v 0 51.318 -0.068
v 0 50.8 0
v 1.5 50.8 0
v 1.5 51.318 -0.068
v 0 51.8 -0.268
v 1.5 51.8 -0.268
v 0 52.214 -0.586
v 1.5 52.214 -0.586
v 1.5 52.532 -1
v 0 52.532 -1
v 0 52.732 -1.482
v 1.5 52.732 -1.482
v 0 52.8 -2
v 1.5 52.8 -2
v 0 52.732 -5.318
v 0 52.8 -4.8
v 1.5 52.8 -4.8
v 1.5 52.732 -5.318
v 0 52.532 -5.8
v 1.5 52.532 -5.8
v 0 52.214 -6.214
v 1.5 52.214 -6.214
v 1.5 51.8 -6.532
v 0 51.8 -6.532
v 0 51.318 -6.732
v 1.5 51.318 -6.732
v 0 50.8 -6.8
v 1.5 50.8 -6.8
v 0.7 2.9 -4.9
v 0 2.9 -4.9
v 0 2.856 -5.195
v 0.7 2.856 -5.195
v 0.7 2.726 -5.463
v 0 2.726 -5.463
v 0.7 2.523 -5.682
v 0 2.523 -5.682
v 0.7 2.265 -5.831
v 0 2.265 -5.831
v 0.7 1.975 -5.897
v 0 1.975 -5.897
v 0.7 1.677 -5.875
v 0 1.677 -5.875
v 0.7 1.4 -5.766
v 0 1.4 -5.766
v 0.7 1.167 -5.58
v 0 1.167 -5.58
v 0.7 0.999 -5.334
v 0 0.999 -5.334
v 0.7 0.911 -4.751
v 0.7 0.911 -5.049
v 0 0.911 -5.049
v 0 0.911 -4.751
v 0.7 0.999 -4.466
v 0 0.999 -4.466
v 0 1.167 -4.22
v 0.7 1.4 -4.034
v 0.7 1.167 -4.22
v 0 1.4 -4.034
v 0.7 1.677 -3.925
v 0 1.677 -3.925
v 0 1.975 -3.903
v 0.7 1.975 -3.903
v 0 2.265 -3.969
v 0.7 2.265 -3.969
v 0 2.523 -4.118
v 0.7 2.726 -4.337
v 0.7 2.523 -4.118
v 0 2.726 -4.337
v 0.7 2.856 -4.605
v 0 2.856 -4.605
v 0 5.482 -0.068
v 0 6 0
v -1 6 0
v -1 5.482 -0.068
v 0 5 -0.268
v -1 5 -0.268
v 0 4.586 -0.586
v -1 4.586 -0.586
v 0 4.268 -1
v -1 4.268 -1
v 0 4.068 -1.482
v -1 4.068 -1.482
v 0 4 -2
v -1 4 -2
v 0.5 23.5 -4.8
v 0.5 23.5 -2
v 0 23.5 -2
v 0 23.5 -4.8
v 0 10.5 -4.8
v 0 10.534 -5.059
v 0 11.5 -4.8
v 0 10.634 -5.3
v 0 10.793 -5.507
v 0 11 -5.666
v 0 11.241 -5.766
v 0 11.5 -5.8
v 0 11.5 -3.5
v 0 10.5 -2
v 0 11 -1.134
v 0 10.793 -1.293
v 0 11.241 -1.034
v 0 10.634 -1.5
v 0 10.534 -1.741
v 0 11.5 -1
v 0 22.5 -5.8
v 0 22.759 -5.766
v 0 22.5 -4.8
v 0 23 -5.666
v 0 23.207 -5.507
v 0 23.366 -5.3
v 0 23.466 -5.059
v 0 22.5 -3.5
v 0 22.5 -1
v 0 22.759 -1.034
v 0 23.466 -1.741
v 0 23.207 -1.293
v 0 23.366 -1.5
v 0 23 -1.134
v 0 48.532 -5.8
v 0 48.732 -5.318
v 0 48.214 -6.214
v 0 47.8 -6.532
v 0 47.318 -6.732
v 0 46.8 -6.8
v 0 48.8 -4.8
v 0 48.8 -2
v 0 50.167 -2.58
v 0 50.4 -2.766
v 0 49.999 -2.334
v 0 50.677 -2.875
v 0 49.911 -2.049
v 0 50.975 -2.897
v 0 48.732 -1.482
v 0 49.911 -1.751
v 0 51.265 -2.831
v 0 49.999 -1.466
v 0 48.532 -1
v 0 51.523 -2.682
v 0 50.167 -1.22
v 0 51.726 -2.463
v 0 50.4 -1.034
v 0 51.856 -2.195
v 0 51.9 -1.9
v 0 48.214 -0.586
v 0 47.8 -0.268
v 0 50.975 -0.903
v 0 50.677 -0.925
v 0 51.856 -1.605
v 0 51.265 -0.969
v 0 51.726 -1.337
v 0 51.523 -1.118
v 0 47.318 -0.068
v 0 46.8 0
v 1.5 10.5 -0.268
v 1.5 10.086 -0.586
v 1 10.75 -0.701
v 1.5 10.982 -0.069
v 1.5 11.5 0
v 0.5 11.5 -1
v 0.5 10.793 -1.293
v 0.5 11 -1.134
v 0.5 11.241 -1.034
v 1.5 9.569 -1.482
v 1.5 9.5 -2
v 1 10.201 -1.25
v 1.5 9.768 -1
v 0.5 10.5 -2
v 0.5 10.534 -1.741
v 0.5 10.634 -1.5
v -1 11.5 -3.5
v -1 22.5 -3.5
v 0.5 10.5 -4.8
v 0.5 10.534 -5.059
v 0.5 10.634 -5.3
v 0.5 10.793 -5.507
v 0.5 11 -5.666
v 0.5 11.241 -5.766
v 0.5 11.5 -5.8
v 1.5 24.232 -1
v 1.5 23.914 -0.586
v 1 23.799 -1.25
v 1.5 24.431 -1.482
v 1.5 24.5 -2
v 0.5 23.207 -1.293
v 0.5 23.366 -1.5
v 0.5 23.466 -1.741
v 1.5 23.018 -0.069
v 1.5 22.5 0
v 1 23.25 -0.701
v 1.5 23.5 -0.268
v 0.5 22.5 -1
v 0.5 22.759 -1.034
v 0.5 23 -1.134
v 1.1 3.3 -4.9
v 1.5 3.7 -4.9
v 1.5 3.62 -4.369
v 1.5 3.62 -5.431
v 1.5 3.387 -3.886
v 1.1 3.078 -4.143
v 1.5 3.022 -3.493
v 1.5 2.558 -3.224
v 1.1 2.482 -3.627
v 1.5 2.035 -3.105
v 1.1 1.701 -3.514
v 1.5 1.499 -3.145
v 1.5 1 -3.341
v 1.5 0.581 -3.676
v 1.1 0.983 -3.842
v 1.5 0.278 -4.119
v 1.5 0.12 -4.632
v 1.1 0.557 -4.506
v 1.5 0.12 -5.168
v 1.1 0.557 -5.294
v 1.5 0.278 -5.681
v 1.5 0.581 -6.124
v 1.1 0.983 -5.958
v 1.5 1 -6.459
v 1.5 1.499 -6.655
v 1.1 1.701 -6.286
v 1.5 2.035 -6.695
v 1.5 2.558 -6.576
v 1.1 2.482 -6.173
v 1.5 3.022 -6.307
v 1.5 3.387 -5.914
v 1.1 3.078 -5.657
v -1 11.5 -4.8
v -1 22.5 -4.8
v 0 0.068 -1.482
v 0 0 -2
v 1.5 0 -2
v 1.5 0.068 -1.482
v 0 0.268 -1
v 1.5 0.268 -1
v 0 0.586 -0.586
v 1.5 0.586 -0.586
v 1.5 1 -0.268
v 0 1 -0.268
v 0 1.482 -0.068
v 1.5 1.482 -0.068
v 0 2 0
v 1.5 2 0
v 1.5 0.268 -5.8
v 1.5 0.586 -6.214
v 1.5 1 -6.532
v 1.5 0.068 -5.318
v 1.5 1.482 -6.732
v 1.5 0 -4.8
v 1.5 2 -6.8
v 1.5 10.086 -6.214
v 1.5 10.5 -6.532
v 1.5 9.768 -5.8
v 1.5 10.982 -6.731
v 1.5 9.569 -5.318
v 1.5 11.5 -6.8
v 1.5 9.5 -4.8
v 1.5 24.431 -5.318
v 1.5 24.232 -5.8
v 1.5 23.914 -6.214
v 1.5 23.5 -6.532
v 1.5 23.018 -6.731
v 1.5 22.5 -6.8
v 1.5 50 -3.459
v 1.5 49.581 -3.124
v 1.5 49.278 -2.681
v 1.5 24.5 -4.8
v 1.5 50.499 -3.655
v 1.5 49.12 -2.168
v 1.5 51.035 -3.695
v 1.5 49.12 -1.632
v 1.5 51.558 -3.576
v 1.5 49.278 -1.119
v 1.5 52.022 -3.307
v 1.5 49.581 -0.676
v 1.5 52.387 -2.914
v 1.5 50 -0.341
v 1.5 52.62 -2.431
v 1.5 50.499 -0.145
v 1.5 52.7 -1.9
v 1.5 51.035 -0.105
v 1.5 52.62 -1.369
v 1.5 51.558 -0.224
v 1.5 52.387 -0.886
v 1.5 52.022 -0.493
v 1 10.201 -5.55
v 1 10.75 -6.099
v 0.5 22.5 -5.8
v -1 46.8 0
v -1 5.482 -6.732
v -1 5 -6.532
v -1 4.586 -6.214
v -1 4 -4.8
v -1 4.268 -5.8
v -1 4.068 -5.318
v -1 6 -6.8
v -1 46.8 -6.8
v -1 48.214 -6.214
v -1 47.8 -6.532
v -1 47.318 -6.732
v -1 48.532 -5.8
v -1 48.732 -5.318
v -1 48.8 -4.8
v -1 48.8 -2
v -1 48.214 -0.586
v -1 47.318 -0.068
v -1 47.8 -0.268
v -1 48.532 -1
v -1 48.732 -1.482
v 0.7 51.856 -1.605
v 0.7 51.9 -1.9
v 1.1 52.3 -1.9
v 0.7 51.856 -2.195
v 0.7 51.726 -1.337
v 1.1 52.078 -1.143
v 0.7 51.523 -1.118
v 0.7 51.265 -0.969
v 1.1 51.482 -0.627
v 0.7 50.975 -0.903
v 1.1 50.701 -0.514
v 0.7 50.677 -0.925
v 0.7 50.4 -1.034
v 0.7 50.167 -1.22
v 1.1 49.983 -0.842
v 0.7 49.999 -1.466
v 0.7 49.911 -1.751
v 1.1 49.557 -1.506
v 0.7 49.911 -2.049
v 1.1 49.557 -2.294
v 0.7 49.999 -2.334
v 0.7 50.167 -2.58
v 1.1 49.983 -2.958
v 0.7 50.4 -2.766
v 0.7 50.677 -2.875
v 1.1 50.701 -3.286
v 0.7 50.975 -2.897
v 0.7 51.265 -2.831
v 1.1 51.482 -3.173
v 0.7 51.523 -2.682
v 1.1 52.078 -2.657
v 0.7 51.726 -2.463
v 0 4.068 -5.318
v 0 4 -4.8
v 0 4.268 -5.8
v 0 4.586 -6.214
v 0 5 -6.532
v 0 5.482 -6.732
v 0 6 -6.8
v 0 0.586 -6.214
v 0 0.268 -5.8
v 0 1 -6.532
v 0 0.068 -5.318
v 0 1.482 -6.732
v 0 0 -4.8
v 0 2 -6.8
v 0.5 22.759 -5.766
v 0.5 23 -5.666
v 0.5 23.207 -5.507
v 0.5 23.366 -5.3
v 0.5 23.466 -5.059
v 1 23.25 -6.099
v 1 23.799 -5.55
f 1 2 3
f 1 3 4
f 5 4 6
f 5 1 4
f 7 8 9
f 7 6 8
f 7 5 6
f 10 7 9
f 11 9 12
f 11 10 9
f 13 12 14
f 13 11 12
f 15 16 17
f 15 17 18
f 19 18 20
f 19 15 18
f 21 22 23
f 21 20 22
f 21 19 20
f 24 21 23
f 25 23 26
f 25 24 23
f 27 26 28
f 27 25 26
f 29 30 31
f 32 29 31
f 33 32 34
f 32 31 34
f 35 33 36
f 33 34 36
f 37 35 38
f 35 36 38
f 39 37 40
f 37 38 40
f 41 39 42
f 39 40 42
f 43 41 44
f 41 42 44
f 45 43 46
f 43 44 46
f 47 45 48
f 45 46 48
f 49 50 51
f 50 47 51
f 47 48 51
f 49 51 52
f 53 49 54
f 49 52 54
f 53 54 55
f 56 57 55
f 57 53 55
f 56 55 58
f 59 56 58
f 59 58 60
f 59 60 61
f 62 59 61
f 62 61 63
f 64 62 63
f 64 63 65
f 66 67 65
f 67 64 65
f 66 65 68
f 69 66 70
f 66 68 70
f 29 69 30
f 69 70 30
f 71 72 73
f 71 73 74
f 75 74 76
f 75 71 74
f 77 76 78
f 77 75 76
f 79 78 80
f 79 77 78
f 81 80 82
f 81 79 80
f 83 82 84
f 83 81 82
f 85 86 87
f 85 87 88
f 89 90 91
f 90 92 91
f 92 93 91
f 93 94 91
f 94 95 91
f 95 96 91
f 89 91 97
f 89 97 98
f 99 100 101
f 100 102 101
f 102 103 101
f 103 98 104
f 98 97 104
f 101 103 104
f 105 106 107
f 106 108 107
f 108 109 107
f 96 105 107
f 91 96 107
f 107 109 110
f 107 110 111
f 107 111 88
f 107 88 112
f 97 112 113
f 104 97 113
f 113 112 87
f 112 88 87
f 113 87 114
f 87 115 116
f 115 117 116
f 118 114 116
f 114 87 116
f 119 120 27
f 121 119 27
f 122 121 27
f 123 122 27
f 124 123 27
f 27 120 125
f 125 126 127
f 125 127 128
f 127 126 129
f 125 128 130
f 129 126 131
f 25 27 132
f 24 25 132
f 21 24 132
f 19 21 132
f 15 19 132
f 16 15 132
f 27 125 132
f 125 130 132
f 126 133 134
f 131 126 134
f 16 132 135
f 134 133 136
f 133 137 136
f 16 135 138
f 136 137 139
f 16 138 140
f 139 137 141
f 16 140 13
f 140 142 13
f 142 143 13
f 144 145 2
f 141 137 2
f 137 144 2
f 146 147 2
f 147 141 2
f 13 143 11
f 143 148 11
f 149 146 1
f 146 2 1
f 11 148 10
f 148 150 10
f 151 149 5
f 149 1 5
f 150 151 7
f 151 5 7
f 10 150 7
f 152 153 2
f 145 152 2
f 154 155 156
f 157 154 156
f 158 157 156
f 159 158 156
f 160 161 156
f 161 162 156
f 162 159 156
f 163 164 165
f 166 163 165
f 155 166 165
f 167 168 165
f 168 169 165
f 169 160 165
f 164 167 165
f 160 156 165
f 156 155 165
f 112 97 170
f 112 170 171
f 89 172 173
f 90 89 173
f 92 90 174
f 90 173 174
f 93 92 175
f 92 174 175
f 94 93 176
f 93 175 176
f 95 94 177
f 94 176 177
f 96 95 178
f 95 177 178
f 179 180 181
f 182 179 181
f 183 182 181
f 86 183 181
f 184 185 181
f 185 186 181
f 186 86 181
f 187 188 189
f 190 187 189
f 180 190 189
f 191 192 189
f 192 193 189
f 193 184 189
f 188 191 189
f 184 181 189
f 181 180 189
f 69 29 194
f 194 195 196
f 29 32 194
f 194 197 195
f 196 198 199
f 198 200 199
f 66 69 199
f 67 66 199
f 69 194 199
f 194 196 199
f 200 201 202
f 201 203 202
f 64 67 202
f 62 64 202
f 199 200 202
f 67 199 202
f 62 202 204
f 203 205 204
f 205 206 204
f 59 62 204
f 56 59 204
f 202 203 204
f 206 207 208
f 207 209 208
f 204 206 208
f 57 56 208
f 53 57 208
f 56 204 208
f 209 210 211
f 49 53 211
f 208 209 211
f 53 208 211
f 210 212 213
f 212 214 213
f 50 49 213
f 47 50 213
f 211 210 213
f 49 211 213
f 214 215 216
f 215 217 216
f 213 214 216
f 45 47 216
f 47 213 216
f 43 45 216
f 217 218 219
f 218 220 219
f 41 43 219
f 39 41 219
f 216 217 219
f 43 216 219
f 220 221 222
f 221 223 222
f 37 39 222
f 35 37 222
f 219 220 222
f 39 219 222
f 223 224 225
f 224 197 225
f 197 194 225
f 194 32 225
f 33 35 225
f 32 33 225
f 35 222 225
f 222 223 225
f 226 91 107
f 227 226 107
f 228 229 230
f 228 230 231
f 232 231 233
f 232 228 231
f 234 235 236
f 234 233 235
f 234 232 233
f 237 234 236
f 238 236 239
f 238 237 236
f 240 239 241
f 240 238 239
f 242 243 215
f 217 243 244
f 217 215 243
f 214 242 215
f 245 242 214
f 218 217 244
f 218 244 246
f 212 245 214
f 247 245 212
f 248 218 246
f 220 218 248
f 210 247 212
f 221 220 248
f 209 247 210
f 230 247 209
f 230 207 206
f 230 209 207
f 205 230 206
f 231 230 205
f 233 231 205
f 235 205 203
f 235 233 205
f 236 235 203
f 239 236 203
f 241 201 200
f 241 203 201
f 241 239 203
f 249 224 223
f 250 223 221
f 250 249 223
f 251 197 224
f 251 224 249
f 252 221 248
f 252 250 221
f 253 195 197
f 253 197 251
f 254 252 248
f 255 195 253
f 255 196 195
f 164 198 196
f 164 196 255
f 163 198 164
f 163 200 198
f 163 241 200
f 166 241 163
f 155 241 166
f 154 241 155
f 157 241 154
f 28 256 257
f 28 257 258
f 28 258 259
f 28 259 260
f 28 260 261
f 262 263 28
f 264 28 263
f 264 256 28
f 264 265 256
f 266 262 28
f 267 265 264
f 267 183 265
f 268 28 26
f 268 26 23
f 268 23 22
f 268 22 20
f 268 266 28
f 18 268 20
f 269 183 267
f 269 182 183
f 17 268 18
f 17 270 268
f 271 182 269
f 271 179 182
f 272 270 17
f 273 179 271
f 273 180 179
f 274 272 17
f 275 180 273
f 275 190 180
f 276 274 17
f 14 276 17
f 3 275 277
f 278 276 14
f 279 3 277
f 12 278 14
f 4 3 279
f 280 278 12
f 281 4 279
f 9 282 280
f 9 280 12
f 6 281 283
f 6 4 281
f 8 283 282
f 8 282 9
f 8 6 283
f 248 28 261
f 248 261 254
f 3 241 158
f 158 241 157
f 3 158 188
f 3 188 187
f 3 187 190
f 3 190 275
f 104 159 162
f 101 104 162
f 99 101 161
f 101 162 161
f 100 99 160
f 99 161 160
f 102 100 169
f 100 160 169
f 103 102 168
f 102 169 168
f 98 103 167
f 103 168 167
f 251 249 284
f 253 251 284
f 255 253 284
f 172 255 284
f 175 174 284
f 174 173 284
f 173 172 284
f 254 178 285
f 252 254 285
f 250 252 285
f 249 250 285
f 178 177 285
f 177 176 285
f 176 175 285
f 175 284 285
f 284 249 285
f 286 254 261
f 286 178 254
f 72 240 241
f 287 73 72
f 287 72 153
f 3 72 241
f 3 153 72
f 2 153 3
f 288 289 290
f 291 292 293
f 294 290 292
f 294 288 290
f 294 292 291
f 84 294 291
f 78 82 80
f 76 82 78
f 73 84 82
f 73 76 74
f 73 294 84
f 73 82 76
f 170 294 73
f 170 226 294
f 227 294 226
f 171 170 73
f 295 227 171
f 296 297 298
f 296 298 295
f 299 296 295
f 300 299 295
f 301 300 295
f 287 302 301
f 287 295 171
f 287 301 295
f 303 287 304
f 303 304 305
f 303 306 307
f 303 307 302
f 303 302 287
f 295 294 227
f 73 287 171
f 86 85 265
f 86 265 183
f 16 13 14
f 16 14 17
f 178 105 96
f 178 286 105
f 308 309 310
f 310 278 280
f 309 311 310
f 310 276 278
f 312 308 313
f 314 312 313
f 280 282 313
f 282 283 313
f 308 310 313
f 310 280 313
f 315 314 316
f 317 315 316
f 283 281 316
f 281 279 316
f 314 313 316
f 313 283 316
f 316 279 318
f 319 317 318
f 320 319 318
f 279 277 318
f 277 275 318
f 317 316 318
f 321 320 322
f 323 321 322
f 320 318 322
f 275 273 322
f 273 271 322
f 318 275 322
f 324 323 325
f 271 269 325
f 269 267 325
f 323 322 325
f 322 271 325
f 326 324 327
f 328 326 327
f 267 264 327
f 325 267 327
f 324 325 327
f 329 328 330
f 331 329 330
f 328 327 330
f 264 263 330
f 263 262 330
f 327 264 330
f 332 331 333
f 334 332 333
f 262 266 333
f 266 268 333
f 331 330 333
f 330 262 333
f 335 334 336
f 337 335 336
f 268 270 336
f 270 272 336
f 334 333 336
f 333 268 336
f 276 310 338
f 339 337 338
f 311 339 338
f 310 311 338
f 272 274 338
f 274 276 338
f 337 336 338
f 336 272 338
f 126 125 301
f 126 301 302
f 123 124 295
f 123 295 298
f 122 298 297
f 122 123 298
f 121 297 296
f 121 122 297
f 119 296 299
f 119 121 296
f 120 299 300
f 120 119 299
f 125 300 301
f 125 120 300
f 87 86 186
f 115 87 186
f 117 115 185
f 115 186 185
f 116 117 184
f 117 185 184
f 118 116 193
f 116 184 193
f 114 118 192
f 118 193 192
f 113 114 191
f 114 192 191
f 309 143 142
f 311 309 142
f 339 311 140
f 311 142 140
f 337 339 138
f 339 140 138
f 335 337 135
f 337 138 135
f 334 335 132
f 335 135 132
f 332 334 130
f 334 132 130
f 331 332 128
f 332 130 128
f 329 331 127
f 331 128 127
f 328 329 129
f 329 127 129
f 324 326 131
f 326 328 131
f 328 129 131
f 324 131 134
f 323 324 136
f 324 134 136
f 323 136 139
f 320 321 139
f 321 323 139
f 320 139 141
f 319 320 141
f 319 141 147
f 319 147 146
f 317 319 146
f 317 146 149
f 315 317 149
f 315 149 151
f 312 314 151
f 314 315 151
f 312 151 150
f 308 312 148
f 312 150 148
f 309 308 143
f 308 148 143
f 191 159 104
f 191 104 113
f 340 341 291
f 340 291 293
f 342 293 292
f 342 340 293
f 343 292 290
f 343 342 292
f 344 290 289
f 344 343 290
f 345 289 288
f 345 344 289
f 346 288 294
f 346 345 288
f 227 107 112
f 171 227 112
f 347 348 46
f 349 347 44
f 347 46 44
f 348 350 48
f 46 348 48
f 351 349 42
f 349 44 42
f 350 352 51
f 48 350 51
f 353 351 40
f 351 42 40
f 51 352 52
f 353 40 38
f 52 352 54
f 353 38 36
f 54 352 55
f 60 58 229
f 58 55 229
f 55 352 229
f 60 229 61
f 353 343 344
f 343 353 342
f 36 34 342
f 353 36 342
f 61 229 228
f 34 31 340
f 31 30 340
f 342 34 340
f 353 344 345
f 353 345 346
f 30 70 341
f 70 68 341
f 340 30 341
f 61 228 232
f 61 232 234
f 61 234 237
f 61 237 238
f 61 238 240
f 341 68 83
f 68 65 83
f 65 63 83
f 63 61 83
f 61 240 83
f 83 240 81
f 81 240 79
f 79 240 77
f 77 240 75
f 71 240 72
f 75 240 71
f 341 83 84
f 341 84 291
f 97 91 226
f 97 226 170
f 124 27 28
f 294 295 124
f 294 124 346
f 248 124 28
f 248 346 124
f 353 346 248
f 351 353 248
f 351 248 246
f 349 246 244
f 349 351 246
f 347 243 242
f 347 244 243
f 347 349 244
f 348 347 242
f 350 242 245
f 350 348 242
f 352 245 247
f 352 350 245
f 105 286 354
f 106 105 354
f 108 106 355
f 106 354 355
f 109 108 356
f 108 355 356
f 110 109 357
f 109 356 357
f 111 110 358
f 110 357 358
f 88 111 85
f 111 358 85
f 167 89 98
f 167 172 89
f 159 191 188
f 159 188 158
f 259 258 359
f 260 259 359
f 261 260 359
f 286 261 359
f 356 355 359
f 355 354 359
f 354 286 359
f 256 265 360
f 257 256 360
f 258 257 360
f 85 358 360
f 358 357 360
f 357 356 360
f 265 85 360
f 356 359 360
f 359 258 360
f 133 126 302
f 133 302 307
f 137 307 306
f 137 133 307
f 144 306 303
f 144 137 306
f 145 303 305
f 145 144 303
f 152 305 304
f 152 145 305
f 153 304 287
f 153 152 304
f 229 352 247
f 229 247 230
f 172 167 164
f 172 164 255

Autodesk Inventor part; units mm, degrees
ref_plane "YZ Plane" through (0, 0, 0) normal (1, 0, 0) x (0, 1, 0)
ref_plane "XZ Plane" through (0, 0, 0) normal (0, 1, 0) x (-1, 0, 0)
ref_plane "XY Plane" through (0, 0, 0) normal (0, 0, 1) x (1, 0, 0)
sketch "Sketch1" plane through (0, 0, 0) normal (1, 0, 0) x (0, 1, 0)
  line L0 (2, 0) -> (50.8, 0)
  line L1 (52.8, -2) -> (52.8, -4.8)
  line L2 (50.8, -6.8) -> (2, -6.8)
  line L3 (0, -4.8) -> (0, -2)
  arc A0 (2, 0) -> (0, -2) centre (2, -2) ccw
  arc A1 (0, -4.8) -> (2, -6.8) centre (2, -4.8) ccw
  arc A2 (50.8, -6.8) -> (52.8, -4.8) centre (50.8, -4.8) ccw
  arc A3 (52.8, -2) -> (50.8, 0) centre (50.8, -2) ccw
  line L4 (26.4, 0) -> (26.4, -6.5481) construction
  line L5 (52.8, -3.4) -> (39.7965, -3.4) construction
  circle A4 centre (1.9, -1.9) radius 1 construction
  circle A5 centre (50.9, -1.9) radius 1
  circle A6 centre (50.9, -4.9) radius 1 construction
  circle A7 centre (1.9, -4.9) radius 1
  point P0 (0, 0)
  point P1 (52.8, 0)
  point P2 (0, -6.8)
  dimension "d0" = 52.8
  dimension "d1" = 6.8
  dimension "d2" = 2
  dimension "d35" = 2
  dimension "d36" = 0.1
  dimension "d37" = 0.1
extrude "Extrusion1" add sketch "Sketch1" along normal blind 1.5
chamfer "Chamfer1" distance 0.8 angle 45 2 edges at (1.5, 49.9, -1.9) (1.5, 0.9, -4.9)
sketch "Sketch2" plane through (1.5, 0, 0) normal (1, 0, 0) x (0, 0, -1)
  line L0 (0, 50.8) -> (0, 2) projected
  line L1 (2, 23.5) -> (4.8, 23.5)
  line L2 (5.8, 22.5) -> (5.8, 11.5)
  line L3 (4.8, 10.5) -> (2, 10.5)
  line L4 (1, 11.5) -> (1, 22.5)
  arc A0 (5.8, 22.5) -> (4.8, 23.5) centre (4.8, 22.5) ccw
  arc A1 (4.8, 10.5) -> (5.8, 11.5) centre (4.8, 11.5) ccw
  arc A2 (1, 11.5) -> (2, 10.5) centre (2, 11.5) ccw
  arc A3 (2, 23.5) -> (1, 22.5) centre (2, 22.5) ccw
  line L5 (6.8, 2) -> (6.8, 50.8) projected
  line L6 (2, 0) -> (4.8, 0) projected
  point P0 (0, 0)
  dimension "d11" = 1
  dimension "d19" = 1
  dimension "d20" = 13
  dimension "d21" = 1
  dimension "d22" = 1
  dimension "d23" = 1
  dimension "d24" = 1
  dimension "d25" = 10.5
extrude "Extrusion2" cut sketch "Sketch2" against normal blind 1.5
sketch "Sketch3" plane through (0, 0, 0) normal (-1, 0, 0) x (0, 0, 1)
  arc A0 (-4.8, 23.5) -> (-5.8, 22.5) centre (-4.8, 22.5) ccw projected
  arc A1 (-1, 22.5) -> (-2, 23.5) centre (-2, 22.5) ccw projected
  line L0 (-1, 22.5) -> (-1, 11.5) projected
  line L1 (-2, 10.5) -> (-4.8, 10.5) projected
  arc A2 (-5.8, 11.5) -> (-4.8, 10.5) centre (-4.8, 11.5) ccw projected
  line L2 (-5.8, 11.5) -> (-5.8, 22.5) projected
  line L3 (0, 50.8) -> (0, 2) projected
  line L4 (-4.8, 52.8) -> (-2, 52.8) projected
  line L5 (-4.8, 48.8) -> (-2, 48.8)
  line L6 (0, 46.8) -> (0, 6)
  line L7 (-2, 4) -> (-4.8, 4)
  line L8 (-6.8, 6) -> (-6.8, 46.8)
  arc A3 (-4.8, 48.8) -> (-6.8, 46.8) centre (-4.8, 46.8) ccw
  arc A4 (0, 46.8) -> (-2, 48.8) centre (-2, 46.8) ccw
  arc A5 (-2, 4) -> (0, 6) centre (-2, 6) ccw
  arc A6 (-6.8, 6) -> (-4.8, 4) centre (-4.8, 6) ccw
  line L9 (-3.4, 52.8) -> (-3.4, 49.069) construction
  line L10 (0, 26.4) -> (-3, 26.4) construction
  line L11 (-6.8, 26.4) -> (-12.1303, 26.4) construction
  line L12 (-4.8, 23.5) -> (-4.8, 23.5)
  line L13 (-5.8, 22.5) -> (-5.8, 11.5)
  line L14 (-4.8, 10.5) -> (-4.8, 10.5)
  line L15 (-4.8, 10.5) -> (-4.8, 23.5)
  line L16 (-3.5, 23.5) -> (-2, 23.5)
  line L17 (-1, 22.5) -> (-1, 11.5)
  line L18 (-2, 10.5) -> (-3.5, 10.5)
  line L19 (-3.5, 10.5) -> (-3.5, 23.5)
  arc A7 (-4.8, 23.5) -> (-5.8, 22.5) centre (-4.8, 22.5) ccw
  arc A8 (-5.8, 11.5) -> (-4.8, 10.5) centre (-4.8, 11.5) ccw
  arc A9 (-1, 22.5) -> (-2, 23.5) centre (-2, 22.5) ccw
  arc A10 (-2, 10.5) -> (-1, 11.5) centre (-2, 11.5) ccw
  line L20 (-4.8, 23.5) -> (-2, 23.5) projected
  line L21 (-4.8, 22.5) -> (-3.5, 22.5)
  line L22 (-4.8, 11.5) -> (-3.5, 11.5)
  point P0 (0, 0)
  point P1 (0, 4)
  point P2 (0, 48.8)
  point P3 (-6.8, 4)
  point P4 (-6.8, 45.8508)
  point P5 (-6.8, 31.9198)
  point P6 (-6.8, 26.4798)
  point P7 (-6.8, 11.7389)
  dimension "d14" = 6.8
  dimension "d15" = 44.8
  dimension "d16" = 2
  dimension "d29" = 1
  dimension "d30" = 2.5
  dimension "d31" = 1
  dimension "d32" = 1.3
  dimension "d33" = 1
  dimension "d34" = 1
extrude "Extrusion3" add sketch "Sketch3" along normal blind 1 contours L15 A2 L2 A0 | L20 L19 L21 L15 | L16 A1 L0 A10 L1 L19 | L22 L19 L1 L15 | L3 A5 L7 A6 L8 A3 L5 A4
chamfer "Chamfer2" distance 1 angle 45 8 edges at (1.5, 17, -5.8) (1.5, 10.7929, -5.5071) (1.5, 10.5, -3.4) (1.5, 10.7929, -1.2929) (1.5, 17, -1) (1.5, 23.2071, -1.2929) (1.5, 23.5, -3.4) (1.5, 23.2071, -5.5071)
properties part number "IOModulePlate02"
